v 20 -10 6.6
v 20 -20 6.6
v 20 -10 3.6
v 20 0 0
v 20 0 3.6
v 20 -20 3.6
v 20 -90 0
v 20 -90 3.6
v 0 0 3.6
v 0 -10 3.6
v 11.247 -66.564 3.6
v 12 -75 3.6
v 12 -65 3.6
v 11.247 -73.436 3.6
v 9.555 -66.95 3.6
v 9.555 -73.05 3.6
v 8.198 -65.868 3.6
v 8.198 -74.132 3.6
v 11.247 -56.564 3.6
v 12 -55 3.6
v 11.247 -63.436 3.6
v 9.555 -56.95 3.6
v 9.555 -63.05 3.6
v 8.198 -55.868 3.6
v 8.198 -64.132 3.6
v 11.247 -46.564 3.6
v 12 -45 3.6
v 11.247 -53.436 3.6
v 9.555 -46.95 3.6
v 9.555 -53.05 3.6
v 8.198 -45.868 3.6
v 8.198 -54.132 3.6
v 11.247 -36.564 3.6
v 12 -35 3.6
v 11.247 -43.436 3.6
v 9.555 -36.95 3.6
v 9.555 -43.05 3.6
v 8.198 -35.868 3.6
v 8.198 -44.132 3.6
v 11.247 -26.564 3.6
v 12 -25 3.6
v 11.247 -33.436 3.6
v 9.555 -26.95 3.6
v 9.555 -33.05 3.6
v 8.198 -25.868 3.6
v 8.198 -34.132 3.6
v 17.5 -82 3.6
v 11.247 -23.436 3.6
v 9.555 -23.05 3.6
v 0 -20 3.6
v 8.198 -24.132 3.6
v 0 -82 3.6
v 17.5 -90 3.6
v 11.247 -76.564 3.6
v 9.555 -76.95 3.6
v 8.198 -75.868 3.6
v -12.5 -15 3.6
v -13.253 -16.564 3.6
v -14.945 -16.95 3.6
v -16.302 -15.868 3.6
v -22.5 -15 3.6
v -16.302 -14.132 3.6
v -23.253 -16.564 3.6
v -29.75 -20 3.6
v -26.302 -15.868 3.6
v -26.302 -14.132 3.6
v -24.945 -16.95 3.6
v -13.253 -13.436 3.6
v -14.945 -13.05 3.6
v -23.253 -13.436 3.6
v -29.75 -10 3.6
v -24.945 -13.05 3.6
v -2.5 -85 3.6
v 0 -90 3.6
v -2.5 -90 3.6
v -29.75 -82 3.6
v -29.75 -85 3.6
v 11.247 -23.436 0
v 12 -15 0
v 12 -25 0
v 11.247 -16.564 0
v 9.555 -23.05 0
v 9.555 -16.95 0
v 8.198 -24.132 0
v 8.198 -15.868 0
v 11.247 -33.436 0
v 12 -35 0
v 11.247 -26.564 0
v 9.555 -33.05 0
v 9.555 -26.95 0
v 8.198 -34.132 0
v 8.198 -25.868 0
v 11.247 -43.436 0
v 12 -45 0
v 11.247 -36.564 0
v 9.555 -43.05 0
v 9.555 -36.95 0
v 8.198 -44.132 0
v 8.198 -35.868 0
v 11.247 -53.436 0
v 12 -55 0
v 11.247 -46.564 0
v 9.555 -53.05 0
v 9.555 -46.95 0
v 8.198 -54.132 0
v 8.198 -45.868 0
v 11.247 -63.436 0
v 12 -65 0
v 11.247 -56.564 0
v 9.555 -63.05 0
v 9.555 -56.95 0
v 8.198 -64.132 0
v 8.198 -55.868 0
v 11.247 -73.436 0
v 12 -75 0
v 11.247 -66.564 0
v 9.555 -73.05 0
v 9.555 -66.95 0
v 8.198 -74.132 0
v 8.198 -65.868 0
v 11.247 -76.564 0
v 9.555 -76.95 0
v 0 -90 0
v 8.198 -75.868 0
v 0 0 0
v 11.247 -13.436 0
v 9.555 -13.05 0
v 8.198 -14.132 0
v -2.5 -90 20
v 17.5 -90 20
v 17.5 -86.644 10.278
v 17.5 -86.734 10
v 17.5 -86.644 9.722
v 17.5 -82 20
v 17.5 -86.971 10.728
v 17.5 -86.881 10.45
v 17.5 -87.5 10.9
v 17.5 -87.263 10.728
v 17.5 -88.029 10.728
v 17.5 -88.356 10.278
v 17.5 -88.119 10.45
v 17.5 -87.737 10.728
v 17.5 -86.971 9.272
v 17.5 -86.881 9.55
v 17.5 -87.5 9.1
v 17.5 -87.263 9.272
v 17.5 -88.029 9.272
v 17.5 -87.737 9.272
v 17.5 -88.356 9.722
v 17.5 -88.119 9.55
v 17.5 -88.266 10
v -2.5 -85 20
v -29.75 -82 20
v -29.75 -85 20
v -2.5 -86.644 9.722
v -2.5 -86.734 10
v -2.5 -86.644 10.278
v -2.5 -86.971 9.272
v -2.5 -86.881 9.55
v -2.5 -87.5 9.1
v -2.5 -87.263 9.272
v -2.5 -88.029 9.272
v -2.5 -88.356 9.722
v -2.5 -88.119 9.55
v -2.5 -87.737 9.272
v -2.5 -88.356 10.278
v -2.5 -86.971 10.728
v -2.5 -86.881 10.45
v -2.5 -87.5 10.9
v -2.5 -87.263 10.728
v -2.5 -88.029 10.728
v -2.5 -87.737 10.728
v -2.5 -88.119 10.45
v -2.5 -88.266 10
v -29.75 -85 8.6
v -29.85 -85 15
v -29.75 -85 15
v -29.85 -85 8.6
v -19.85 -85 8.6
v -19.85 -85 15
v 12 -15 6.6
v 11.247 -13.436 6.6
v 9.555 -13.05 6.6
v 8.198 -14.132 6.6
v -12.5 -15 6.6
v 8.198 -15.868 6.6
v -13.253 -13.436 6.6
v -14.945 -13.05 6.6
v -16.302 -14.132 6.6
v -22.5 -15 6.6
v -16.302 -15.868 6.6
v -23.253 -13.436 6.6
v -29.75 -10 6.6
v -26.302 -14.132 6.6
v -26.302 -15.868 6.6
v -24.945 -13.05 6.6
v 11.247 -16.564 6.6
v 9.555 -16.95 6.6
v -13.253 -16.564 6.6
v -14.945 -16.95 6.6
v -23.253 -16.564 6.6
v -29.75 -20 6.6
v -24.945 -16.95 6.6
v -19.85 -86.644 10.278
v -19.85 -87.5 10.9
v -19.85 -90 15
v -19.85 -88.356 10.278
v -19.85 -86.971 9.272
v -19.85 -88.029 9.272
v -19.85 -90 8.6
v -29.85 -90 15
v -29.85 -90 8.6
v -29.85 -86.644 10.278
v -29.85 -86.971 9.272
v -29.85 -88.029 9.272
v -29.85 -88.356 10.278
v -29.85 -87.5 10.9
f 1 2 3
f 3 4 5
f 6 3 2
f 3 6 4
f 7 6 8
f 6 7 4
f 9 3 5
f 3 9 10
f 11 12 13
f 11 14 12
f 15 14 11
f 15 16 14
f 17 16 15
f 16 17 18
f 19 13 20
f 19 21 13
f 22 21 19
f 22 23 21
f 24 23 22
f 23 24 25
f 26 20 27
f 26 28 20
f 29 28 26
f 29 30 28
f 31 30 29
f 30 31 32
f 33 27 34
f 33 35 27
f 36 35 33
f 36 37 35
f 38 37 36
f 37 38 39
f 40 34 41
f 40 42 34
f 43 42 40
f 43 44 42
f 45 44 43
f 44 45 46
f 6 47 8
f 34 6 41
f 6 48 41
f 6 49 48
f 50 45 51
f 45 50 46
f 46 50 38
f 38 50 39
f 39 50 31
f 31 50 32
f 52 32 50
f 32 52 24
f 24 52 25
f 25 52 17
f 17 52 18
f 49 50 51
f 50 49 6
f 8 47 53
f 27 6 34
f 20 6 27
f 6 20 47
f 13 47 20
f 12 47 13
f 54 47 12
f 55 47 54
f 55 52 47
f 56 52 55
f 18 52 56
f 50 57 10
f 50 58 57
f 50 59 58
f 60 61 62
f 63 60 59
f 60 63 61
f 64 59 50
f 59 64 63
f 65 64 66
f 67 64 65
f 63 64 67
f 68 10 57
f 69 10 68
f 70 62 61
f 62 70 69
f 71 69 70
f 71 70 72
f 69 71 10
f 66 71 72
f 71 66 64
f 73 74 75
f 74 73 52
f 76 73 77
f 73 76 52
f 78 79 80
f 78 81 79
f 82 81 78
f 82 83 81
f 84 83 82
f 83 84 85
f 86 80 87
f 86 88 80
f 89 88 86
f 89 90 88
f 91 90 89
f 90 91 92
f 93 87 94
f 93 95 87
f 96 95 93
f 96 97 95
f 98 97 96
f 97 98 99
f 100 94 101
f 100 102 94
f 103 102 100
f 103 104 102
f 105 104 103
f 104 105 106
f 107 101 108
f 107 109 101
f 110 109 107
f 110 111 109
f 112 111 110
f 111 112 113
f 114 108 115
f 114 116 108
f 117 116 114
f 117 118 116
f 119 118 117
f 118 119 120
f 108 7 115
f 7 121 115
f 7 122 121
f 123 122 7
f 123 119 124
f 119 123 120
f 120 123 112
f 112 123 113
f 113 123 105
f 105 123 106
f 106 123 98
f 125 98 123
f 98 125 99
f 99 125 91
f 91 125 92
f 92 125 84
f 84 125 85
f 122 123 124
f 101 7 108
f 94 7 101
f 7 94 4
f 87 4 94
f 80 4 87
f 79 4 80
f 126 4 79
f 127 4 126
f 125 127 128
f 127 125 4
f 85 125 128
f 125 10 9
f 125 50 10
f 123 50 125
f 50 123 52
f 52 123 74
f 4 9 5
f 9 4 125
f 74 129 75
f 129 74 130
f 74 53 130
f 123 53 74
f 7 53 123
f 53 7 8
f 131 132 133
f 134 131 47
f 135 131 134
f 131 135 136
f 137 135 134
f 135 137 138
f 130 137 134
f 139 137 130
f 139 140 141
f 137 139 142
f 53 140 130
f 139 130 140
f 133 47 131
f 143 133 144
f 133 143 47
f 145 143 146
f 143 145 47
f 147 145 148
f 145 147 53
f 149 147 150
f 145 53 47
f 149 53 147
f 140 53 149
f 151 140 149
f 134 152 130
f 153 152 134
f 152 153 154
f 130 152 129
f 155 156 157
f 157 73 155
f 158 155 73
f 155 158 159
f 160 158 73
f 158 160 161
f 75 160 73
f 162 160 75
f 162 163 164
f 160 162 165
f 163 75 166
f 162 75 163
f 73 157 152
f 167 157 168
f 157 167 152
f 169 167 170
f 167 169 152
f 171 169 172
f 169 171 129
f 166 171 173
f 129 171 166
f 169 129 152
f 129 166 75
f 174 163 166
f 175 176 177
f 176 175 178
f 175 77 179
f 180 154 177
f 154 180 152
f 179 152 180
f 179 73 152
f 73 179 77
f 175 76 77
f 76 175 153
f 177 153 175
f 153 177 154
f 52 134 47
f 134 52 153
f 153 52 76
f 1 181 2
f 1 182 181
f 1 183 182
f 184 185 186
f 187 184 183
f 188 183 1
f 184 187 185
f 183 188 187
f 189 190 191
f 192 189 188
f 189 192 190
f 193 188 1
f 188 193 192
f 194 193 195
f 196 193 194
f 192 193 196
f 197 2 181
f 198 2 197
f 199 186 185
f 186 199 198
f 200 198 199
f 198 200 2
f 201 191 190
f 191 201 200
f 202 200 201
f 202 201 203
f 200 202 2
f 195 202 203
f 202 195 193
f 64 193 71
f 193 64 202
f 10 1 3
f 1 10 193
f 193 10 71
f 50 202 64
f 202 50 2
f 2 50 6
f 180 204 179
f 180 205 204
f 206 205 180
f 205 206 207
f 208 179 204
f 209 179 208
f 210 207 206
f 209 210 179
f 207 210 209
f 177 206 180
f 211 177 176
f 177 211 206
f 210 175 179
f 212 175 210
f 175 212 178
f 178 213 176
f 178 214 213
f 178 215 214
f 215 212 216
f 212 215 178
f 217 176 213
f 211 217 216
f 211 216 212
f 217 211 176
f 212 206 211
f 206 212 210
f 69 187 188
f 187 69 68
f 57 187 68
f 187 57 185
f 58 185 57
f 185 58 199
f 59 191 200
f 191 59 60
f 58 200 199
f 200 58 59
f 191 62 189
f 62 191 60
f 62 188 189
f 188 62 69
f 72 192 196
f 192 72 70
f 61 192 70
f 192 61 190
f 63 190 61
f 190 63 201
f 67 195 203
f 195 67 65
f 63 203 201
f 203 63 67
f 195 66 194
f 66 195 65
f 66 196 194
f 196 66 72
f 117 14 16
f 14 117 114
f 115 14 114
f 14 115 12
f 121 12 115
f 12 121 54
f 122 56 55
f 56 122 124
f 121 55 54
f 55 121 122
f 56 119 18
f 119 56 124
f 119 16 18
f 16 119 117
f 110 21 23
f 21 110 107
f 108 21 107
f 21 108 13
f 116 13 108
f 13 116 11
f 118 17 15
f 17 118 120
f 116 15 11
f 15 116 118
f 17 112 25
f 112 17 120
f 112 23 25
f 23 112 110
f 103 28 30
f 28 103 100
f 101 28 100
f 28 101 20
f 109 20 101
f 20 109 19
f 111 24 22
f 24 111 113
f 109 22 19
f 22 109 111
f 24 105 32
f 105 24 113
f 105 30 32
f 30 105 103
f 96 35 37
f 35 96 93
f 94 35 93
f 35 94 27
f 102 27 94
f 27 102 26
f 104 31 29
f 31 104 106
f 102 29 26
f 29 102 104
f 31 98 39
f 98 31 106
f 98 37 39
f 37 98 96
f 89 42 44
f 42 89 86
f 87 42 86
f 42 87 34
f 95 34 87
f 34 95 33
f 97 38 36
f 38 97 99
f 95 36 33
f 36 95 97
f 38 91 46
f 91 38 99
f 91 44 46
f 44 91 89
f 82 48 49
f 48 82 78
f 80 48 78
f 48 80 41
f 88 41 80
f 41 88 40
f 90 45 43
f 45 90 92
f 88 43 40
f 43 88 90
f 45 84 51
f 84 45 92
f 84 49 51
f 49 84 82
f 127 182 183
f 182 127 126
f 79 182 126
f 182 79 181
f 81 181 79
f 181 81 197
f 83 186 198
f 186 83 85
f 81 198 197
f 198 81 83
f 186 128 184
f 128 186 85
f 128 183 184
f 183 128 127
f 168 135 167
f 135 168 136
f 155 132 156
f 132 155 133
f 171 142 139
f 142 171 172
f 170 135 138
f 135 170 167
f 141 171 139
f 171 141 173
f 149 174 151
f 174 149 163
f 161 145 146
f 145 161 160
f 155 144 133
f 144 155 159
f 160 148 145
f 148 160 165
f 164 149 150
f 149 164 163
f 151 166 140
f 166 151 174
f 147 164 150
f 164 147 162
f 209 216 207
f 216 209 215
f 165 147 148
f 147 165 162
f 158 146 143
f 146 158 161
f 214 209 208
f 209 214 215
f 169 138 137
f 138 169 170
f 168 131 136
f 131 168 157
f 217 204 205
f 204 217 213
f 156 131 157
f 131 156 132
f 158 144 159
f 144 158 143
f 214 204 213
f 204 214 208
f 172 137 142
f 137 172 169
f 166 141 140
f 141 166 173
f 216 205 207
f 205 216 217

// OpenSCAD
difference() {
	union() {
		translate(v = [0, -90.0, 0]) {
			cube(size = [20.0, 90.0, 3.6]);
		}
		translate(v = [-2.5, -90.0, 3.6]) {
			cube(size = [20.0, 5.0, 16.4]);
		}
		translate(v = [-29.75, -85.0, 3.6]) {
			cube(size = [47.25, 3.0, 16.4]);
		}
		translate(v = [-29.75, -20.0, 3.6]) {
			cube(size = [49.75, 10.0, 3.0]);
		}
		translate(v = [-29.85, -90.0, 8.6]) {
			cube(size = [10.0, 5.0, 6.4]);
		}
	}
	translate(v = [-12.5, -87.5, 10.0]) {
		rotate(a = [0, 90, 0]) {
			cylinder(d = 1.8, h = 80.0);
		}
	}
	translate(v = [27.5, -87.5, 10.0]) {
		rotate(a = [0, 180, 0]) {
			rotate(a = [0, 90, 0]) {
				cylinder(d = 1.8, h = 80.0);
			}
		}
	}
	union() {
		translate(v = [-14.5, -15.0, -1]) {
			cylinder(d = 4.0, h = 8.6);
		}
		translate(v = [-24.5, -15.0, -1]) {
			cylinder(d = 4.0, h = 8.6);
		}
		translate(v = [10.0, -75.0, -1]) {
			cylinder(d = 4.0, h = 8.6);
		}
		translate(v = [10.0, -65.0, -1]) {
			cylinder(d = 4.0, h = 8.6);
		}
		translate(v = [10.0, -55.0, -1]) {
			cylinder(d = 4.0, h = 8.6);
		}
		translate(v = [10.0, -45.0, -1]) {
			cylinder(d = 4.0, h = 8.6);
		}
		translate(v = [10.0, -35.0, -1]) {
			cylinder(d = 4.0, h = 8.6);
		}
		translate(v = [10.0, -25.0, -1]) {
			cylinder(d = 4.0, h = 8.6);
		}
		translate(v = [10.0, -15.0, -1]) {
			cylinder(d = 4.0, h = 8.6);
		}
	}
}
